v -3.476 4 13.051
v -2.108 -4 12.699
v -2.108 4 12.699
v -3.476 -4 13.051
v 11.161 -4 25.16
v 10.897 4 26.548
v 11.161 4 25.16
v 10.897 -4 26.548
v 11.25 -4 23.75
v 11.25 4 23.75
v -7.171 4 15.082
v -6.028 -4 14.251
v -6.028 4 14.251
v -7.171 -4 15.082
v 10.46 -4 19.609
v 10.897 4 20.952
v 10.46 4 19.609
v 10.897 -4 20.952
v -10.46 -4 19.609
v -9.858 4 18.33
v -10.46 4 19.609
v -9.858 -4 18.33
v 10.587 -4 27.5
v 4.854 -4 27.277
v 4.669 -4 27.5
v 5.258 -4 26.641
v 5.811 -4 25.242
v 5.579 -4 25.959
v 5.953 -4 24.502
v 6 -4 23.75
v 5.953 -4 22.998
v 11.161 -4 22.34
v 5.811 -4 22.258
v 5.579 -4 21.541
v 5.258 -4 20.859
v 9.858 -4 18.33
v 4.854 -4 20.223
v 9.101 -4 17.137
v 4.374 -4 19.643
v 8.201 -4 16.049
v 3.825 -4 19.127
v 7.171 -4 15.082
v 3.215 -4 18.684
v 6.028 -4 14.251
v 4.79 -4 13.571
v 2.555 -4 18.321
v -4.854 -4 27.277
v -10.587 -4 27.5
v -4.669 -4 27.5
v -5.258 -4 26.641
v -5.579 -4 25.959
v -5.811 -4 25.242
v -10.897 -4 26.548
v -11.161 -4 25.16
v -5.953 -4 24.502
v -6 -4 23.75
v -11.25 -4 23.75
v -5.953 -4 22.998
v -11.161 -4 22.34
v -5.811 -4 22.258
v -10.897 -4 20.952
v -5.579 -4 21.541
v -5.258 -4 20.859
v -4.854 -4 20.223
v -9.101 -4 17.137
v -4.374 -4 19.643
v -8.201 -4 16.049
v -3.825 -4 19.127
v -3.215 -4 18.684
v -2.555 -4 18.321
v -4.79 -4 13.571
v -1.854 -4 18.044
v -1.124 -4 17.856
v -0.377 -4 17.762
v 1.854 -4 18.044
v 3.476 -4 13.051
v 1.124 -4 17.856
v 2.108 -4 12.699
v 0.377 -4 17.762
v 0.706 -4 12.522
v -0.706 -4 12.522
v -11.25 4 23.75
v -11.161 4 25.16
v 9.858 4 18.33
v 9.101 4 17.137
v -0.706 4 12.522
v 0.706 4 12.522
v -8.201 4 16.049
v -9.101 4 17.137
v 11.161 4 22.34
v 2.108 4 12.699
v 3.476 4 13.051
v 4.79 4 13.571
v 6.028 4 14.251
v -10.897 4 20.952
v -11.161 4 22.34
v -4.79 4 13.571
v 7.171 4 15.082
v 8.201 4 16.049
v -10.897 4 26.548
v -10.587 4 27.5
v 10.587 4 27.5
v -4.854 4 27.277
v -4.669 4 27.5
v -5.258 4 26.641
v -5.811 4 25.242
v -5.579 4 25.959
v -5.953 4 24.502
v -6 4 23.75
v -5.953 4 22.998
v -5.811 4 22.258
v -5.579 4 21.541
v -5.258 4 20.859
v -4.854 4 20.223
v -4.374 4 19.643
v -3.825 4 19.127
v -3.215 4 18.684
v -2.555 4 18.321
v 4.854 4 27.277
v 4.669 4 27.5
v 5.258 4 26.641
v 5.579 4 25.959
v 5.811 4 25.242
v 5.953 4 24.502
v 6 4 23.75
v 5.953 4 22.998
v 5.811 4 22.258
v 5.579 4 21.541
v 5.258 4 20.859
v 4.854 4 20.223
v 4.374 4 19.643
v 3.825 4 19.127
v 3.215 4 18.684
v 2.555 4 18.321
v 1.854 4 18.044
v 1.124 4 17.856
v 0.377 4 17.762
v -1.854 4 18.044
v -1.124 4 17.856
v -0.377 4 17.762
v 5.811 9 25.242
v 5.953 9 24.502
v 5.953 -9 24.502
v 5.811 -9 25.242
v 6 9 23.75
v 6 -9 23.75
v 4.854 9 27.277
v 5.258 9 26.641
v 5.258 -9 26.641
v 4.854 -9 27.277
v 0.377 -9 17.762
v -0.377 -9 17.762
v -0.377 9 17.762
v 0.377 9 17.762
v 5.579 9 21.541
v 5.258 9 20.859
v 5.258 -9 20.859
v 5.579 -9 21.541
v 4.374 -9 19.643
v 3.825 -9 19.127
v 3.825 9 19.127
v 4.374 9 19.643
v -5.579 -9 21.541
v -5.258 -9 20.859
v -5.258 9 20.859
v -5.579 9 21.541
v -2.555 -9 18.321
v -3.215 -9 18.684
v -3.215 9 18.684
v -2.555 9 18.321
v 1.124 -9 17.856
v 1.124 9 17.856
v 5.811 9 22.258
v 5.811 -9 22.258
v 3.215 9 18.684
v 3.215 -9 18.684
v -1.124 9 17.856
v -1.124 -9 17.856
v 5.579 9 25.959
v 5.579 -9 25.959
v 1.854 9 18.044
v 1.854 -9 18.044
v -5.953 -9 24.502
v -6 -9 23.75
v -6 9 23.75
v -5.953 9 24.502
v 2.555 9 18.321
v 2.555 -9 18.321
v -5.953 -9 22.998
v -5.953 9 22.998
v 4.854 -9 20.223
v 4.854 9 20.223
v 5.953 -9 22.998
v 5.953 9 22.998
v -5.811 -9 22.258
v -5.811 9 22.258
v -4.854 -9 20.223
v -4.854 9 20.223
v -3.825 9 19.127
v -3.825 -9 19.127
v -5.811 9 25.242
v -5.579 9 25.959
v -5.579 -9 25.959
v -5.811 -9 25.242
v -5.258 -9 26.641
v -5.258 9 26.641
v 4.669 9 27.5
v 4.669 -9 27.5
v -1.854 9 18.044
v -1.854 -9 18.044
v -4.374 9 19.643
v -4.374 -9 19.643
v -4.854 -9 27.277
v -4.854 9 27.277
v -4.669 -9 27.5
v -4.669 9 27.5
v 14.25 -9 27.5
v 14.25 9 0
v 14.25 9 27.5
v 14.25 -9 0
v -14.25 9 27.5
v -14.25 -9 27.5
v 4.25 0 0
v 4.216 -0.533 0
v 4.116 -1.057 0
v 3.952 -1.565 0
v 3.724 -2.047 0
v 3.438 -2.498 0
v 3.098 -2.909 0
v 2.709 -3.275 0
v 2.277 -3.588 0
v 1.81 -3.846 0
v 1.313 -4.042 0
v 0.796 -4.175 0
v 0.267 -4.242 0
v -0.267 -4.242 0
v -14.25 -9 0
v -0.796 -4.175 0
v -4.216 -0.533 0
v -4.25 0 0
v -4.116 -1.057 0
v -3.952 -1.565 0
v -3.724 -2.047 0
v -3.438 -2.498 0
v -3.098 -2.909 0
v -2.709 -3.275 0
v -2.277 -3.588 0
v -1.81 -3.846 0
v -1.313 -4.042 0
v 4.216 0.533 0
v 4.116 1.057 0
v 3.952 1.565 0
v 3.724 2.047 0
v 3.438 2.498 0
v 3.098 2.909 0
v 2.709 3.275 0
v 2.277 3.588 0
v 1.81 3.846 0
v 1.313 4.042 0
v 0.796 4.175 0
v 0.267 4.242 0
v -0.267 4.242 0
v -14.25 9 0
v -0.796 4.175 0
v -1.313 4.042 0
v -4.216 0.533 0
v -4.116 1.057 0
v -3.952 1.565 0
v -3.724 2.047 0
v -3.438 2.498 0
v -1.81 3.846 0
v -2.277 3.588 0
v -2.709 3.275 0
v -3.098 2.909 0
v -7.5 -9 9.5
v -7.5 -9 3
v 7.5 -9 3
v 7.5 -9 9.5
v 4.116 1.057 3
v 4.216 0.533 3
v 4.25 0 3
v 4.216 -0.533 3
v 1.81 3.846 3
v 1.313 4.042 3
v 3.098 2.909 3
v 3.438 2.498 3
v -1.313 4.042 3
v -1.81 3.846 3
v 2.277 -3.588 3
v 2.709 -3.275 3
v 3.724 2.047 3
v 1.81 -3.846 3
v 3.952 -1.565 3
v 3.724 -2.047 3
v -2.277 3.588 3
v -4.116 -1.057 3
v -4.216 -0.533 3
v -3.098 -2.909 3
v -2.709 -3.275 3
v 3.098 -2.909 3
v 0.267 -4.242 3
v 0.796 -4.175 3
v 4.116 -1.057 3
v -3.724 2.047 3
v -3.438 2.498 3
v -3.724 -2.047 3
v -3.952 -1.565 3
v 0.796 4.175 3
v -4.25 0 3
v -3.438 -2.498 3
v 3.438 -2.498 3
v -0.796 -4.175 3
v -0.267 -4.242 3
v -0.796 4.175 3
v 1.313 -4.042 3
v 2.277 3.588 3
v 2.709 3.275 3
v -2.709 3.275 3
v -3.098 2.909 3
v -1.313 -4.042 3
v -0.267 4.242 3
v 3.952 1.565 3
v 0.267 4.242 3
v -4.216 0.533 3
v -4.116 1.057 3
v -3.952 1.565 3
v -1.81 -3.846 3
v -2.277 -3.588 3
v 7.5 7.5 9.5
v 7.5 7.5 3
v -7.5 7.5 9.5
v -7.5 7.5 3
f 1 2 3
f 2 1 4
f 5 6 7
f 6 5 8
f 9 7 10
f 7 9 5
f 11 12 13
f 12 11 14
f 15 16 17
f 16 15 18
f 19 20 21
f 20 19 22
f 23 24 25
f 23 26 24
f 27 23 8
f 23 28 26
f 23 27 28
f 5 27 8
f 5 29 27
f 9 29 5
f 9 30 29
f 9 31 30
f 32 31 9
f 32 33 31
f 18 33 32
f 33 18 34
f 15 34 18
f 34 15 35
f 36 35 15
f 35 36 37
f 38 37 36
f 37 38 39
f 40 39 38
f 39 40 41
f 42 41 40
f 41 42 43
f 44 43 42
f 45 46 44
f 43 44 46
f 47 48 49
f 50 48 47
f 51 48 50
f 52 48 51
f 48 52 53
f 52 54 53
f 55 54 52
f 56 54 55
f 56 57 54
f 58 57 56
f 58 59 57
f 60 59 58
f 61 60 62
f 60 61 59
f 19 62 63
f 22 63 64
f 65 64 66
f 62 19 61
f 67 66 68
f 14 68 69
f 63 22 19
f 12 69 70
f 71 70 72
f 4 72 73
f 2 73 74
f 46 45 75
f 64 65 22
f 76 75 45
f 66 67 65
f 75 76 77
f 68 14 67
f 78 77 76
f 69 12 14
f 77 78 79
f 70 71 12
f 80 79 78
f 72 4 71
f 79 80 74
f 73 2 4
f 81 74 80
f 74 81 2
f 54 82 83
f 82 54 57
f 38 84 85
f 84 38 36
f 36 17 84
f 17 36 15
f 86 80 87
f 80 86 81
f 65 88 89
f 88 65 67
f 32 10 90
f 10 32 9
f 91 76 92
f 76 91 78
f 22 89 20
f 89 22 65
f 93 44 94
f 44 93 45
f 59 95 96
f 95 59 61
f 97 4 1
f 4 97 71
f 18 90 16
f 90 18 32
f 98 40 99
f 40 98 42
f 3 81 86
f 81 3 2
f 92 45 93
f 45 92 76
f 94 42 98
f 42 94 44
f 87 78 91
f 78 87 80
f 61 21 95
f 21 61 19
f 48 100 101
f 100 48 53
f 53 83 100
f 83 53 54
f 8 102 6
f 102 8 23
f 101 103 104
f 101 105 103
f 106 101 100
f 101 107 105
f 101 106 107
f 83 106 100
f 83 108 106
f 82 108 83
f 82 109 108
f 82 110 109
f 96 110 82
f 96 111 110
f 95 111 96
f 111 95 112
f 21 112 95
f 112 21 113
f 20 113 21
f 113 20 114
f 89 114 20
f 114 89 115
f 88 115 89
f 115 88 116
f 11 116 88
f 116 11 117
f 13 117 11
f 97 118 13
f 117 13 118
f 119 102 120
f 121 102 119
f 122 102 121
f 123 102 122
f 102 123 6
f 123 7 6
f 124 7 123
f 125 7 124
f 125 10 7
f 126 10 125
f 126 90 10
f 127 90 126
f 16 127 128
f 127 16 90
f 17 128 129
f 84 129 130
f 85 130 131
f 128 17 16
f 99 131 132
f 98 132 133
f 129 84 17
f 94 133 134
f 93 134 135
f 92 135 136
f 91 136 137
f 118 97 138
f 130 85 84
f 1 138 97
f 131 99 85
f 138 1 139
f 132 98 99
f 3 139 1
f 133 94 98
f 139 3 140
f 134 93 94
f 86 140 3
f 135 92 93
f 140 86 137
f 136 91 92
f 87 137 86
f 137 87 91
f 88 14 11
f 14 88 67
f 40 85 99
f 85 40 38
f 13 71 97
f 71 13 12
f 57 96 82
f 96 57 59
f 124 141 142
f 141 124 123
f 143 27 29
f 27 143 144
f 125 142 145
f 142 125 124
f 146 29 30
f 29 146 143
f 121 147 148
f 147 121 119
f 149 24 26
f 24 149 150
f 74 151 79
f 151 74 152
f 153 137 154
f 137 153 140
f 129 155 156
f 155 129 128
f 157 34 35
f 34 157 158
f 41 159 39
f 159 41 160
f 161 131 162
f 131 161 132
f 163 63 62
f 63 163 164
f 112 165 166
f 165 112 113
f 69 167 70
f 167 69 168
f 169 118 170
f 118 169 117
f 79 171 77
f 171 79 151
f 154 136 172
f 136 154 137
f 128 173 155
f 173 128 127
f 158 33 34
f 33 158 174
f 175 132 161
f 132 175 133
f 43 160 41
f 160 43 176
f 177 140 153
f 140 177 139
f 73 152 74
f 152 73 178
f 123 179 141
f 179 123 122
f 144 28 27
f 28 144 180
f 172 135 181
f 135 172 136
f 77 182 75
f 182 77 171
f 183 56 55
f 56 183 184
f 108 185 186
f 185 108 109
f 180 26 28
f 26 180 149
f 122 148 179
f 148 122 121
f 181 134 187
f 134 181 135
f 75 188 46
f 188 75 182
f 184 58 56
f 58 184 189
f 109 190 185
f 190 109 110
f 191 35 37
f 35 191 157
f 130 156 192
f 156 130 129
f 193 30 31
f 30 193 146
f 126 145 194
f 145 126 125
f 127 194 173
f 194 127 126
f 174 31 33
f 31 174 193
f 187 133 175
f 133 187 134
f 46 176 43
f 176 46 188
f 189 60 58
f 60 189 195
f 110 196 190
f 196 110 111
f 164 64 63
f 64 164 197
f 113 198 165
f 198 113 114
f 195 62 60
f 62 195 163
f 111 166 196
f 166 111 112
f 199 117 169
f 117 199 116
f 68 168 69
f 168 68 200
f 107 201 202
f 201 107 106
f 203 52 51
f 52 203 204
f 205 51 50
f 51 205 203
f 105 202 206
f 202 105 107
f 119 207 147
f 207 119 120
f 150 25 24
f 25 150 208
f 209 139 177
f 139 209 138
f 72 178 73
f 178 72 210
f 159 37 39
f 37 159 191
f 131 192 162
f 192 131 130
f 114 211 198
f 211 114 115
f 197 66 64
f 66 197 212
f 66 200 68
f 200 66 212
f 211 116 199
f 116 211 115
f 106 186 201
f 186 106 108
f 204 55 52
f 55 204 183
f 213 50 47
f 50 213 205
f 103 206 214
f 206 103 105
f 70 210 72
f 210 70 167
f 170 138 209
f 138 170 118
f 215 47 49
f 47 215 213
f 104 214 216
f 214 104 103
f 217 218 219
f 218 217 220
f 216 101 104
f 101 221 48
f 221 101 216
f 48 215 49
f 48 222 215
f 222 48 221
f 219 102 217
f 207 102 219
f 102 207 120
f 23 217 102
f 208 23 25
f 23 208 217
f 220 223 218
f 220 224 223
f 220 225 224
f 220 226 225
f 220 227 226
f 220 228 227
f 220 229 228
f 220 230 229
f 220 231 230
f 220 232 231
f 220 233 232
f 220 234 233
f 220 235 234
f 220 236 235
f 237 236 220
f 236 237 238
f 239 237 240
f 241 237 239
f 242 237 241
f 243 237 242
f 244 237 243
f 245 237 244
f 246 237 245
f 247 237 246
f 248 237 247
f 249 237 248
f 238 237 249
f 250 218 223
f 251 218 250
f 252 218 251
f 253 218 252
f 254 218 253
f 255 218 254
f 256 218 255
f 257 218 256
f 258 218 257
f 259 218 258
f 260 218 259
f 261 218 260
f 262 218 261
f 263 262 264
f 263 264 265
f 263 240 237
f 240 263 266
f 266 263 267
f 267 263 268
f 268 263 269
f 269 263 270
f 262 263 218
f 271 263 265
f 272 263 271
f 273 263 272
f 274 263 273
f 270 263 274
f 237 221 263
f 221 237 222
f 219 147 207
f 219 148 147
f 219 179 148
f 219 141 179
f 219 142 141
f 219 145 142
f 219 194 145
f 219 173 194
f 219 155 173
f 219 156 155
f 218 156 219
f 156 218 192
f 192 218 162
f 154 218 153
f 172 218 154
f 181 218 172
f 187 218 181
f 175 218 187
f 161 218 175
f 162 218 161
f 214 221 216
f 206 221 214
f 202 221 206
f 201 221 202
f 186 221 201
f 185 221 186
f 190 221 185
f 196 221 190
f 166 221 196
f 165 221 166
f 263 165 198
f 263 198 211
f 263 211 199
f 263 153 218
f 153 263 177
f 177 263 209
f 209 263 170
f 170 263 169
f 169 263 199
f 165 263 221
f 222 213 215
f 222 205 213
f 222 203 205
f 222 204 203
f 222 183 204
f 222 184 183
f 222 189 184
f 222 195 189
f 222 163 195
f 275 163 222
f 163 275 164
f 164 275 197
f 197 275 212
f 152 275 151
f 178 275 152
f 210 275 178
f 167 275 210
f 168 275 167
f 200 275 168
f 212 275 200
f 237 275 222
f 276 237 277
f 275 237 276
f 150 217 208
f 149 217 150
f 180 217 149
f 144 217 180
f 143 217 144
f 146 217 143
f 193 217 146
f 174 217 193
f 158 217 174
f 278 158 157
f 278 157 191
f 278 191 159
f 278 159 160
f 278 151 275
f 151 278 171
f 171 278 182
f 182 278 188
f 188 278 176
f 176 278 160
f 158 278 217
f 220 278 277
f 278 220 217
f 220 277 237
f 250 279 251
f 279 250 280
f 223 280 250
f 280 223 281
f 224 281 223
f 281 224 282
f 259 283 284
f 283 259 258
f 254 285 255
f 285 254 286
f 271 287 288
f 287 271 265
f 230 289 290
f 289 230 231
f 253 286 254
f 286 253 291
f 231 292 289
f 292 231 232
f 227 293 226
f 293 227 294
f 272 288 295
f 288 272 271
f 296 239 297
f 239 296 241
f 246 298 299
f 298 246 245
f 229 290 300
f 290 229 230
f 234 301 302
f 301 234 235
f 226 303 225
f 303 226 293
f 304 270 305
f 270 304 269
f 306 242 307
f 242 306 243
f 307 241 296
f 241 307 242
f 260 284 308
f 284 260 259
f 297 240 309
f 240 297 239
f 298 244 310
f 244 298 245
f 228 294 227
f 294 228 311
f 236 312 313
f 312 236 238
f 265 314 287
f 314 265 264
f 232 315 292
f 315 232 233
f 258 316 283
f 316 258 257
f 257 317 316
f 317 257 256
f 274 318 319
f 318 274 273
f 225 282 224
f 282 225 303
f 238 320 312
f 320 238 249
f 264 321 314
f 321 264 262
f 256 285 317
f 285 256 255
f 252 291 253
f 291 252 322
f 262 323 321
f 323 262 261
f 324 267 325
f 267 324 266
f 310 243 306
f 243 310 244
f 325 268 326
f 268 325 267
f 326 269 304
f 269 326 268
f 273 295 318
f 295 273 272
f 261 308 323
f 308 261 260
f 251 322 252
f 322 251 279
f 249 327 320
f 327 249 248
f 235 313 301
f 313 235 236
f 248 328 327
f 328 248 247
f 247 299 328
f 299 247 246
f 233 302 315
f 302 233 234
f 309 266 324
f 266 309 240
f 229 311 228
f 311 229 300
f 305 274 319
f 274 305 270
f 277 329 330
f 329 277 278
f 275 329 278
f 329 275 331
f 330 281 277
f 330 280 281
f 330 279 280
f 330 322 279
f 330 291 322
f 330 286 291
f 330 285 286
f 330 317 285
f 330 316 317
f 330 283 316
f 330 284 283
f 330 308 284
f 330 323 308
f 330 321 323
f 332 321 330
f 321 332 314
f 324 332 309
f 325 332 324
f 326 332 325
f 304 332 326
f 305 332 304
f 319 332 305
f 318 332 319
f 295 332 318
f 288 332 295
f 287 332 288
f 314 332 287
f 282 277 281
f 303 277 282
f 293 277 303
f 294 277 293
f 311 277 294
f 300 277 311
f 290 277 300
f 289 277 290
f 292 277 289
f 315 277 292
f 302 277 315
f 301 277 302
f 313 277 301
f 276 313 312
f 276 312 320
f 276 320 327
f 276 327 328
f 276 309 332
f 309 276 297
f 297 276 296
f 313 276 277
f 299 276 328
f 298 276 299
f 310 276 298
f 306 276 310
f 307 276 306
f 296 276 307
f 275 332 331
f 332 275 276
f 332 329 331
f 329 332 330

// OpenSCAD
M8BoltThick = 6.5;
M8BoltWidth = 15;
M8BoltHoleDiameter = 8.5;
Bearing608zzThick = 8;
Bearing608zzDiameter = 22.5;
M8ThreadDiameter = 12;
XWallThick = 3;
YWallThick = 5;
ZWallThick = 3;

difference() {
    translate([-(XWallThick*2+Bearing608zzDiameter)/2, -(YWallThick*2+Bearing608zzThick)/2, 0]) {
        cube([XWallThick*2+Bearing608zzDiameter, YWallThick*2+Bearing608zzThick, ZWallThick*2 + M8BoltThick + Bearing608zzDiameter*2/3]);
    }
    translate([0,0,-1]) {
        cylinder(r=M8BoltHoleDiameter/2, h=ZWallThick+1.01, $fn=50);
    }
    translate([-M8BoltWidth/2,-M8BoltWidth/2-YWallThick-1,ZWallThick]) {
        cube([M8BoltWidth, M8BoltWidth+YWallThick+1, M8BoltThick]);
    }
    translate([0,0,ZWallThick*2+M8BoltThick+Bearing608zzDiameter/2]) {
        rotate([90,0,0]) {
            cylinder(r=Bearing608zzDiameter/2, h=Bearing608zzThick, $fn=50, center=true);
            cylinder(r=M8ThreadDiameter/2, h=Bearing608zzThick+YWallThick*2+2, $fn=50, center=true);
        }
    }
}
